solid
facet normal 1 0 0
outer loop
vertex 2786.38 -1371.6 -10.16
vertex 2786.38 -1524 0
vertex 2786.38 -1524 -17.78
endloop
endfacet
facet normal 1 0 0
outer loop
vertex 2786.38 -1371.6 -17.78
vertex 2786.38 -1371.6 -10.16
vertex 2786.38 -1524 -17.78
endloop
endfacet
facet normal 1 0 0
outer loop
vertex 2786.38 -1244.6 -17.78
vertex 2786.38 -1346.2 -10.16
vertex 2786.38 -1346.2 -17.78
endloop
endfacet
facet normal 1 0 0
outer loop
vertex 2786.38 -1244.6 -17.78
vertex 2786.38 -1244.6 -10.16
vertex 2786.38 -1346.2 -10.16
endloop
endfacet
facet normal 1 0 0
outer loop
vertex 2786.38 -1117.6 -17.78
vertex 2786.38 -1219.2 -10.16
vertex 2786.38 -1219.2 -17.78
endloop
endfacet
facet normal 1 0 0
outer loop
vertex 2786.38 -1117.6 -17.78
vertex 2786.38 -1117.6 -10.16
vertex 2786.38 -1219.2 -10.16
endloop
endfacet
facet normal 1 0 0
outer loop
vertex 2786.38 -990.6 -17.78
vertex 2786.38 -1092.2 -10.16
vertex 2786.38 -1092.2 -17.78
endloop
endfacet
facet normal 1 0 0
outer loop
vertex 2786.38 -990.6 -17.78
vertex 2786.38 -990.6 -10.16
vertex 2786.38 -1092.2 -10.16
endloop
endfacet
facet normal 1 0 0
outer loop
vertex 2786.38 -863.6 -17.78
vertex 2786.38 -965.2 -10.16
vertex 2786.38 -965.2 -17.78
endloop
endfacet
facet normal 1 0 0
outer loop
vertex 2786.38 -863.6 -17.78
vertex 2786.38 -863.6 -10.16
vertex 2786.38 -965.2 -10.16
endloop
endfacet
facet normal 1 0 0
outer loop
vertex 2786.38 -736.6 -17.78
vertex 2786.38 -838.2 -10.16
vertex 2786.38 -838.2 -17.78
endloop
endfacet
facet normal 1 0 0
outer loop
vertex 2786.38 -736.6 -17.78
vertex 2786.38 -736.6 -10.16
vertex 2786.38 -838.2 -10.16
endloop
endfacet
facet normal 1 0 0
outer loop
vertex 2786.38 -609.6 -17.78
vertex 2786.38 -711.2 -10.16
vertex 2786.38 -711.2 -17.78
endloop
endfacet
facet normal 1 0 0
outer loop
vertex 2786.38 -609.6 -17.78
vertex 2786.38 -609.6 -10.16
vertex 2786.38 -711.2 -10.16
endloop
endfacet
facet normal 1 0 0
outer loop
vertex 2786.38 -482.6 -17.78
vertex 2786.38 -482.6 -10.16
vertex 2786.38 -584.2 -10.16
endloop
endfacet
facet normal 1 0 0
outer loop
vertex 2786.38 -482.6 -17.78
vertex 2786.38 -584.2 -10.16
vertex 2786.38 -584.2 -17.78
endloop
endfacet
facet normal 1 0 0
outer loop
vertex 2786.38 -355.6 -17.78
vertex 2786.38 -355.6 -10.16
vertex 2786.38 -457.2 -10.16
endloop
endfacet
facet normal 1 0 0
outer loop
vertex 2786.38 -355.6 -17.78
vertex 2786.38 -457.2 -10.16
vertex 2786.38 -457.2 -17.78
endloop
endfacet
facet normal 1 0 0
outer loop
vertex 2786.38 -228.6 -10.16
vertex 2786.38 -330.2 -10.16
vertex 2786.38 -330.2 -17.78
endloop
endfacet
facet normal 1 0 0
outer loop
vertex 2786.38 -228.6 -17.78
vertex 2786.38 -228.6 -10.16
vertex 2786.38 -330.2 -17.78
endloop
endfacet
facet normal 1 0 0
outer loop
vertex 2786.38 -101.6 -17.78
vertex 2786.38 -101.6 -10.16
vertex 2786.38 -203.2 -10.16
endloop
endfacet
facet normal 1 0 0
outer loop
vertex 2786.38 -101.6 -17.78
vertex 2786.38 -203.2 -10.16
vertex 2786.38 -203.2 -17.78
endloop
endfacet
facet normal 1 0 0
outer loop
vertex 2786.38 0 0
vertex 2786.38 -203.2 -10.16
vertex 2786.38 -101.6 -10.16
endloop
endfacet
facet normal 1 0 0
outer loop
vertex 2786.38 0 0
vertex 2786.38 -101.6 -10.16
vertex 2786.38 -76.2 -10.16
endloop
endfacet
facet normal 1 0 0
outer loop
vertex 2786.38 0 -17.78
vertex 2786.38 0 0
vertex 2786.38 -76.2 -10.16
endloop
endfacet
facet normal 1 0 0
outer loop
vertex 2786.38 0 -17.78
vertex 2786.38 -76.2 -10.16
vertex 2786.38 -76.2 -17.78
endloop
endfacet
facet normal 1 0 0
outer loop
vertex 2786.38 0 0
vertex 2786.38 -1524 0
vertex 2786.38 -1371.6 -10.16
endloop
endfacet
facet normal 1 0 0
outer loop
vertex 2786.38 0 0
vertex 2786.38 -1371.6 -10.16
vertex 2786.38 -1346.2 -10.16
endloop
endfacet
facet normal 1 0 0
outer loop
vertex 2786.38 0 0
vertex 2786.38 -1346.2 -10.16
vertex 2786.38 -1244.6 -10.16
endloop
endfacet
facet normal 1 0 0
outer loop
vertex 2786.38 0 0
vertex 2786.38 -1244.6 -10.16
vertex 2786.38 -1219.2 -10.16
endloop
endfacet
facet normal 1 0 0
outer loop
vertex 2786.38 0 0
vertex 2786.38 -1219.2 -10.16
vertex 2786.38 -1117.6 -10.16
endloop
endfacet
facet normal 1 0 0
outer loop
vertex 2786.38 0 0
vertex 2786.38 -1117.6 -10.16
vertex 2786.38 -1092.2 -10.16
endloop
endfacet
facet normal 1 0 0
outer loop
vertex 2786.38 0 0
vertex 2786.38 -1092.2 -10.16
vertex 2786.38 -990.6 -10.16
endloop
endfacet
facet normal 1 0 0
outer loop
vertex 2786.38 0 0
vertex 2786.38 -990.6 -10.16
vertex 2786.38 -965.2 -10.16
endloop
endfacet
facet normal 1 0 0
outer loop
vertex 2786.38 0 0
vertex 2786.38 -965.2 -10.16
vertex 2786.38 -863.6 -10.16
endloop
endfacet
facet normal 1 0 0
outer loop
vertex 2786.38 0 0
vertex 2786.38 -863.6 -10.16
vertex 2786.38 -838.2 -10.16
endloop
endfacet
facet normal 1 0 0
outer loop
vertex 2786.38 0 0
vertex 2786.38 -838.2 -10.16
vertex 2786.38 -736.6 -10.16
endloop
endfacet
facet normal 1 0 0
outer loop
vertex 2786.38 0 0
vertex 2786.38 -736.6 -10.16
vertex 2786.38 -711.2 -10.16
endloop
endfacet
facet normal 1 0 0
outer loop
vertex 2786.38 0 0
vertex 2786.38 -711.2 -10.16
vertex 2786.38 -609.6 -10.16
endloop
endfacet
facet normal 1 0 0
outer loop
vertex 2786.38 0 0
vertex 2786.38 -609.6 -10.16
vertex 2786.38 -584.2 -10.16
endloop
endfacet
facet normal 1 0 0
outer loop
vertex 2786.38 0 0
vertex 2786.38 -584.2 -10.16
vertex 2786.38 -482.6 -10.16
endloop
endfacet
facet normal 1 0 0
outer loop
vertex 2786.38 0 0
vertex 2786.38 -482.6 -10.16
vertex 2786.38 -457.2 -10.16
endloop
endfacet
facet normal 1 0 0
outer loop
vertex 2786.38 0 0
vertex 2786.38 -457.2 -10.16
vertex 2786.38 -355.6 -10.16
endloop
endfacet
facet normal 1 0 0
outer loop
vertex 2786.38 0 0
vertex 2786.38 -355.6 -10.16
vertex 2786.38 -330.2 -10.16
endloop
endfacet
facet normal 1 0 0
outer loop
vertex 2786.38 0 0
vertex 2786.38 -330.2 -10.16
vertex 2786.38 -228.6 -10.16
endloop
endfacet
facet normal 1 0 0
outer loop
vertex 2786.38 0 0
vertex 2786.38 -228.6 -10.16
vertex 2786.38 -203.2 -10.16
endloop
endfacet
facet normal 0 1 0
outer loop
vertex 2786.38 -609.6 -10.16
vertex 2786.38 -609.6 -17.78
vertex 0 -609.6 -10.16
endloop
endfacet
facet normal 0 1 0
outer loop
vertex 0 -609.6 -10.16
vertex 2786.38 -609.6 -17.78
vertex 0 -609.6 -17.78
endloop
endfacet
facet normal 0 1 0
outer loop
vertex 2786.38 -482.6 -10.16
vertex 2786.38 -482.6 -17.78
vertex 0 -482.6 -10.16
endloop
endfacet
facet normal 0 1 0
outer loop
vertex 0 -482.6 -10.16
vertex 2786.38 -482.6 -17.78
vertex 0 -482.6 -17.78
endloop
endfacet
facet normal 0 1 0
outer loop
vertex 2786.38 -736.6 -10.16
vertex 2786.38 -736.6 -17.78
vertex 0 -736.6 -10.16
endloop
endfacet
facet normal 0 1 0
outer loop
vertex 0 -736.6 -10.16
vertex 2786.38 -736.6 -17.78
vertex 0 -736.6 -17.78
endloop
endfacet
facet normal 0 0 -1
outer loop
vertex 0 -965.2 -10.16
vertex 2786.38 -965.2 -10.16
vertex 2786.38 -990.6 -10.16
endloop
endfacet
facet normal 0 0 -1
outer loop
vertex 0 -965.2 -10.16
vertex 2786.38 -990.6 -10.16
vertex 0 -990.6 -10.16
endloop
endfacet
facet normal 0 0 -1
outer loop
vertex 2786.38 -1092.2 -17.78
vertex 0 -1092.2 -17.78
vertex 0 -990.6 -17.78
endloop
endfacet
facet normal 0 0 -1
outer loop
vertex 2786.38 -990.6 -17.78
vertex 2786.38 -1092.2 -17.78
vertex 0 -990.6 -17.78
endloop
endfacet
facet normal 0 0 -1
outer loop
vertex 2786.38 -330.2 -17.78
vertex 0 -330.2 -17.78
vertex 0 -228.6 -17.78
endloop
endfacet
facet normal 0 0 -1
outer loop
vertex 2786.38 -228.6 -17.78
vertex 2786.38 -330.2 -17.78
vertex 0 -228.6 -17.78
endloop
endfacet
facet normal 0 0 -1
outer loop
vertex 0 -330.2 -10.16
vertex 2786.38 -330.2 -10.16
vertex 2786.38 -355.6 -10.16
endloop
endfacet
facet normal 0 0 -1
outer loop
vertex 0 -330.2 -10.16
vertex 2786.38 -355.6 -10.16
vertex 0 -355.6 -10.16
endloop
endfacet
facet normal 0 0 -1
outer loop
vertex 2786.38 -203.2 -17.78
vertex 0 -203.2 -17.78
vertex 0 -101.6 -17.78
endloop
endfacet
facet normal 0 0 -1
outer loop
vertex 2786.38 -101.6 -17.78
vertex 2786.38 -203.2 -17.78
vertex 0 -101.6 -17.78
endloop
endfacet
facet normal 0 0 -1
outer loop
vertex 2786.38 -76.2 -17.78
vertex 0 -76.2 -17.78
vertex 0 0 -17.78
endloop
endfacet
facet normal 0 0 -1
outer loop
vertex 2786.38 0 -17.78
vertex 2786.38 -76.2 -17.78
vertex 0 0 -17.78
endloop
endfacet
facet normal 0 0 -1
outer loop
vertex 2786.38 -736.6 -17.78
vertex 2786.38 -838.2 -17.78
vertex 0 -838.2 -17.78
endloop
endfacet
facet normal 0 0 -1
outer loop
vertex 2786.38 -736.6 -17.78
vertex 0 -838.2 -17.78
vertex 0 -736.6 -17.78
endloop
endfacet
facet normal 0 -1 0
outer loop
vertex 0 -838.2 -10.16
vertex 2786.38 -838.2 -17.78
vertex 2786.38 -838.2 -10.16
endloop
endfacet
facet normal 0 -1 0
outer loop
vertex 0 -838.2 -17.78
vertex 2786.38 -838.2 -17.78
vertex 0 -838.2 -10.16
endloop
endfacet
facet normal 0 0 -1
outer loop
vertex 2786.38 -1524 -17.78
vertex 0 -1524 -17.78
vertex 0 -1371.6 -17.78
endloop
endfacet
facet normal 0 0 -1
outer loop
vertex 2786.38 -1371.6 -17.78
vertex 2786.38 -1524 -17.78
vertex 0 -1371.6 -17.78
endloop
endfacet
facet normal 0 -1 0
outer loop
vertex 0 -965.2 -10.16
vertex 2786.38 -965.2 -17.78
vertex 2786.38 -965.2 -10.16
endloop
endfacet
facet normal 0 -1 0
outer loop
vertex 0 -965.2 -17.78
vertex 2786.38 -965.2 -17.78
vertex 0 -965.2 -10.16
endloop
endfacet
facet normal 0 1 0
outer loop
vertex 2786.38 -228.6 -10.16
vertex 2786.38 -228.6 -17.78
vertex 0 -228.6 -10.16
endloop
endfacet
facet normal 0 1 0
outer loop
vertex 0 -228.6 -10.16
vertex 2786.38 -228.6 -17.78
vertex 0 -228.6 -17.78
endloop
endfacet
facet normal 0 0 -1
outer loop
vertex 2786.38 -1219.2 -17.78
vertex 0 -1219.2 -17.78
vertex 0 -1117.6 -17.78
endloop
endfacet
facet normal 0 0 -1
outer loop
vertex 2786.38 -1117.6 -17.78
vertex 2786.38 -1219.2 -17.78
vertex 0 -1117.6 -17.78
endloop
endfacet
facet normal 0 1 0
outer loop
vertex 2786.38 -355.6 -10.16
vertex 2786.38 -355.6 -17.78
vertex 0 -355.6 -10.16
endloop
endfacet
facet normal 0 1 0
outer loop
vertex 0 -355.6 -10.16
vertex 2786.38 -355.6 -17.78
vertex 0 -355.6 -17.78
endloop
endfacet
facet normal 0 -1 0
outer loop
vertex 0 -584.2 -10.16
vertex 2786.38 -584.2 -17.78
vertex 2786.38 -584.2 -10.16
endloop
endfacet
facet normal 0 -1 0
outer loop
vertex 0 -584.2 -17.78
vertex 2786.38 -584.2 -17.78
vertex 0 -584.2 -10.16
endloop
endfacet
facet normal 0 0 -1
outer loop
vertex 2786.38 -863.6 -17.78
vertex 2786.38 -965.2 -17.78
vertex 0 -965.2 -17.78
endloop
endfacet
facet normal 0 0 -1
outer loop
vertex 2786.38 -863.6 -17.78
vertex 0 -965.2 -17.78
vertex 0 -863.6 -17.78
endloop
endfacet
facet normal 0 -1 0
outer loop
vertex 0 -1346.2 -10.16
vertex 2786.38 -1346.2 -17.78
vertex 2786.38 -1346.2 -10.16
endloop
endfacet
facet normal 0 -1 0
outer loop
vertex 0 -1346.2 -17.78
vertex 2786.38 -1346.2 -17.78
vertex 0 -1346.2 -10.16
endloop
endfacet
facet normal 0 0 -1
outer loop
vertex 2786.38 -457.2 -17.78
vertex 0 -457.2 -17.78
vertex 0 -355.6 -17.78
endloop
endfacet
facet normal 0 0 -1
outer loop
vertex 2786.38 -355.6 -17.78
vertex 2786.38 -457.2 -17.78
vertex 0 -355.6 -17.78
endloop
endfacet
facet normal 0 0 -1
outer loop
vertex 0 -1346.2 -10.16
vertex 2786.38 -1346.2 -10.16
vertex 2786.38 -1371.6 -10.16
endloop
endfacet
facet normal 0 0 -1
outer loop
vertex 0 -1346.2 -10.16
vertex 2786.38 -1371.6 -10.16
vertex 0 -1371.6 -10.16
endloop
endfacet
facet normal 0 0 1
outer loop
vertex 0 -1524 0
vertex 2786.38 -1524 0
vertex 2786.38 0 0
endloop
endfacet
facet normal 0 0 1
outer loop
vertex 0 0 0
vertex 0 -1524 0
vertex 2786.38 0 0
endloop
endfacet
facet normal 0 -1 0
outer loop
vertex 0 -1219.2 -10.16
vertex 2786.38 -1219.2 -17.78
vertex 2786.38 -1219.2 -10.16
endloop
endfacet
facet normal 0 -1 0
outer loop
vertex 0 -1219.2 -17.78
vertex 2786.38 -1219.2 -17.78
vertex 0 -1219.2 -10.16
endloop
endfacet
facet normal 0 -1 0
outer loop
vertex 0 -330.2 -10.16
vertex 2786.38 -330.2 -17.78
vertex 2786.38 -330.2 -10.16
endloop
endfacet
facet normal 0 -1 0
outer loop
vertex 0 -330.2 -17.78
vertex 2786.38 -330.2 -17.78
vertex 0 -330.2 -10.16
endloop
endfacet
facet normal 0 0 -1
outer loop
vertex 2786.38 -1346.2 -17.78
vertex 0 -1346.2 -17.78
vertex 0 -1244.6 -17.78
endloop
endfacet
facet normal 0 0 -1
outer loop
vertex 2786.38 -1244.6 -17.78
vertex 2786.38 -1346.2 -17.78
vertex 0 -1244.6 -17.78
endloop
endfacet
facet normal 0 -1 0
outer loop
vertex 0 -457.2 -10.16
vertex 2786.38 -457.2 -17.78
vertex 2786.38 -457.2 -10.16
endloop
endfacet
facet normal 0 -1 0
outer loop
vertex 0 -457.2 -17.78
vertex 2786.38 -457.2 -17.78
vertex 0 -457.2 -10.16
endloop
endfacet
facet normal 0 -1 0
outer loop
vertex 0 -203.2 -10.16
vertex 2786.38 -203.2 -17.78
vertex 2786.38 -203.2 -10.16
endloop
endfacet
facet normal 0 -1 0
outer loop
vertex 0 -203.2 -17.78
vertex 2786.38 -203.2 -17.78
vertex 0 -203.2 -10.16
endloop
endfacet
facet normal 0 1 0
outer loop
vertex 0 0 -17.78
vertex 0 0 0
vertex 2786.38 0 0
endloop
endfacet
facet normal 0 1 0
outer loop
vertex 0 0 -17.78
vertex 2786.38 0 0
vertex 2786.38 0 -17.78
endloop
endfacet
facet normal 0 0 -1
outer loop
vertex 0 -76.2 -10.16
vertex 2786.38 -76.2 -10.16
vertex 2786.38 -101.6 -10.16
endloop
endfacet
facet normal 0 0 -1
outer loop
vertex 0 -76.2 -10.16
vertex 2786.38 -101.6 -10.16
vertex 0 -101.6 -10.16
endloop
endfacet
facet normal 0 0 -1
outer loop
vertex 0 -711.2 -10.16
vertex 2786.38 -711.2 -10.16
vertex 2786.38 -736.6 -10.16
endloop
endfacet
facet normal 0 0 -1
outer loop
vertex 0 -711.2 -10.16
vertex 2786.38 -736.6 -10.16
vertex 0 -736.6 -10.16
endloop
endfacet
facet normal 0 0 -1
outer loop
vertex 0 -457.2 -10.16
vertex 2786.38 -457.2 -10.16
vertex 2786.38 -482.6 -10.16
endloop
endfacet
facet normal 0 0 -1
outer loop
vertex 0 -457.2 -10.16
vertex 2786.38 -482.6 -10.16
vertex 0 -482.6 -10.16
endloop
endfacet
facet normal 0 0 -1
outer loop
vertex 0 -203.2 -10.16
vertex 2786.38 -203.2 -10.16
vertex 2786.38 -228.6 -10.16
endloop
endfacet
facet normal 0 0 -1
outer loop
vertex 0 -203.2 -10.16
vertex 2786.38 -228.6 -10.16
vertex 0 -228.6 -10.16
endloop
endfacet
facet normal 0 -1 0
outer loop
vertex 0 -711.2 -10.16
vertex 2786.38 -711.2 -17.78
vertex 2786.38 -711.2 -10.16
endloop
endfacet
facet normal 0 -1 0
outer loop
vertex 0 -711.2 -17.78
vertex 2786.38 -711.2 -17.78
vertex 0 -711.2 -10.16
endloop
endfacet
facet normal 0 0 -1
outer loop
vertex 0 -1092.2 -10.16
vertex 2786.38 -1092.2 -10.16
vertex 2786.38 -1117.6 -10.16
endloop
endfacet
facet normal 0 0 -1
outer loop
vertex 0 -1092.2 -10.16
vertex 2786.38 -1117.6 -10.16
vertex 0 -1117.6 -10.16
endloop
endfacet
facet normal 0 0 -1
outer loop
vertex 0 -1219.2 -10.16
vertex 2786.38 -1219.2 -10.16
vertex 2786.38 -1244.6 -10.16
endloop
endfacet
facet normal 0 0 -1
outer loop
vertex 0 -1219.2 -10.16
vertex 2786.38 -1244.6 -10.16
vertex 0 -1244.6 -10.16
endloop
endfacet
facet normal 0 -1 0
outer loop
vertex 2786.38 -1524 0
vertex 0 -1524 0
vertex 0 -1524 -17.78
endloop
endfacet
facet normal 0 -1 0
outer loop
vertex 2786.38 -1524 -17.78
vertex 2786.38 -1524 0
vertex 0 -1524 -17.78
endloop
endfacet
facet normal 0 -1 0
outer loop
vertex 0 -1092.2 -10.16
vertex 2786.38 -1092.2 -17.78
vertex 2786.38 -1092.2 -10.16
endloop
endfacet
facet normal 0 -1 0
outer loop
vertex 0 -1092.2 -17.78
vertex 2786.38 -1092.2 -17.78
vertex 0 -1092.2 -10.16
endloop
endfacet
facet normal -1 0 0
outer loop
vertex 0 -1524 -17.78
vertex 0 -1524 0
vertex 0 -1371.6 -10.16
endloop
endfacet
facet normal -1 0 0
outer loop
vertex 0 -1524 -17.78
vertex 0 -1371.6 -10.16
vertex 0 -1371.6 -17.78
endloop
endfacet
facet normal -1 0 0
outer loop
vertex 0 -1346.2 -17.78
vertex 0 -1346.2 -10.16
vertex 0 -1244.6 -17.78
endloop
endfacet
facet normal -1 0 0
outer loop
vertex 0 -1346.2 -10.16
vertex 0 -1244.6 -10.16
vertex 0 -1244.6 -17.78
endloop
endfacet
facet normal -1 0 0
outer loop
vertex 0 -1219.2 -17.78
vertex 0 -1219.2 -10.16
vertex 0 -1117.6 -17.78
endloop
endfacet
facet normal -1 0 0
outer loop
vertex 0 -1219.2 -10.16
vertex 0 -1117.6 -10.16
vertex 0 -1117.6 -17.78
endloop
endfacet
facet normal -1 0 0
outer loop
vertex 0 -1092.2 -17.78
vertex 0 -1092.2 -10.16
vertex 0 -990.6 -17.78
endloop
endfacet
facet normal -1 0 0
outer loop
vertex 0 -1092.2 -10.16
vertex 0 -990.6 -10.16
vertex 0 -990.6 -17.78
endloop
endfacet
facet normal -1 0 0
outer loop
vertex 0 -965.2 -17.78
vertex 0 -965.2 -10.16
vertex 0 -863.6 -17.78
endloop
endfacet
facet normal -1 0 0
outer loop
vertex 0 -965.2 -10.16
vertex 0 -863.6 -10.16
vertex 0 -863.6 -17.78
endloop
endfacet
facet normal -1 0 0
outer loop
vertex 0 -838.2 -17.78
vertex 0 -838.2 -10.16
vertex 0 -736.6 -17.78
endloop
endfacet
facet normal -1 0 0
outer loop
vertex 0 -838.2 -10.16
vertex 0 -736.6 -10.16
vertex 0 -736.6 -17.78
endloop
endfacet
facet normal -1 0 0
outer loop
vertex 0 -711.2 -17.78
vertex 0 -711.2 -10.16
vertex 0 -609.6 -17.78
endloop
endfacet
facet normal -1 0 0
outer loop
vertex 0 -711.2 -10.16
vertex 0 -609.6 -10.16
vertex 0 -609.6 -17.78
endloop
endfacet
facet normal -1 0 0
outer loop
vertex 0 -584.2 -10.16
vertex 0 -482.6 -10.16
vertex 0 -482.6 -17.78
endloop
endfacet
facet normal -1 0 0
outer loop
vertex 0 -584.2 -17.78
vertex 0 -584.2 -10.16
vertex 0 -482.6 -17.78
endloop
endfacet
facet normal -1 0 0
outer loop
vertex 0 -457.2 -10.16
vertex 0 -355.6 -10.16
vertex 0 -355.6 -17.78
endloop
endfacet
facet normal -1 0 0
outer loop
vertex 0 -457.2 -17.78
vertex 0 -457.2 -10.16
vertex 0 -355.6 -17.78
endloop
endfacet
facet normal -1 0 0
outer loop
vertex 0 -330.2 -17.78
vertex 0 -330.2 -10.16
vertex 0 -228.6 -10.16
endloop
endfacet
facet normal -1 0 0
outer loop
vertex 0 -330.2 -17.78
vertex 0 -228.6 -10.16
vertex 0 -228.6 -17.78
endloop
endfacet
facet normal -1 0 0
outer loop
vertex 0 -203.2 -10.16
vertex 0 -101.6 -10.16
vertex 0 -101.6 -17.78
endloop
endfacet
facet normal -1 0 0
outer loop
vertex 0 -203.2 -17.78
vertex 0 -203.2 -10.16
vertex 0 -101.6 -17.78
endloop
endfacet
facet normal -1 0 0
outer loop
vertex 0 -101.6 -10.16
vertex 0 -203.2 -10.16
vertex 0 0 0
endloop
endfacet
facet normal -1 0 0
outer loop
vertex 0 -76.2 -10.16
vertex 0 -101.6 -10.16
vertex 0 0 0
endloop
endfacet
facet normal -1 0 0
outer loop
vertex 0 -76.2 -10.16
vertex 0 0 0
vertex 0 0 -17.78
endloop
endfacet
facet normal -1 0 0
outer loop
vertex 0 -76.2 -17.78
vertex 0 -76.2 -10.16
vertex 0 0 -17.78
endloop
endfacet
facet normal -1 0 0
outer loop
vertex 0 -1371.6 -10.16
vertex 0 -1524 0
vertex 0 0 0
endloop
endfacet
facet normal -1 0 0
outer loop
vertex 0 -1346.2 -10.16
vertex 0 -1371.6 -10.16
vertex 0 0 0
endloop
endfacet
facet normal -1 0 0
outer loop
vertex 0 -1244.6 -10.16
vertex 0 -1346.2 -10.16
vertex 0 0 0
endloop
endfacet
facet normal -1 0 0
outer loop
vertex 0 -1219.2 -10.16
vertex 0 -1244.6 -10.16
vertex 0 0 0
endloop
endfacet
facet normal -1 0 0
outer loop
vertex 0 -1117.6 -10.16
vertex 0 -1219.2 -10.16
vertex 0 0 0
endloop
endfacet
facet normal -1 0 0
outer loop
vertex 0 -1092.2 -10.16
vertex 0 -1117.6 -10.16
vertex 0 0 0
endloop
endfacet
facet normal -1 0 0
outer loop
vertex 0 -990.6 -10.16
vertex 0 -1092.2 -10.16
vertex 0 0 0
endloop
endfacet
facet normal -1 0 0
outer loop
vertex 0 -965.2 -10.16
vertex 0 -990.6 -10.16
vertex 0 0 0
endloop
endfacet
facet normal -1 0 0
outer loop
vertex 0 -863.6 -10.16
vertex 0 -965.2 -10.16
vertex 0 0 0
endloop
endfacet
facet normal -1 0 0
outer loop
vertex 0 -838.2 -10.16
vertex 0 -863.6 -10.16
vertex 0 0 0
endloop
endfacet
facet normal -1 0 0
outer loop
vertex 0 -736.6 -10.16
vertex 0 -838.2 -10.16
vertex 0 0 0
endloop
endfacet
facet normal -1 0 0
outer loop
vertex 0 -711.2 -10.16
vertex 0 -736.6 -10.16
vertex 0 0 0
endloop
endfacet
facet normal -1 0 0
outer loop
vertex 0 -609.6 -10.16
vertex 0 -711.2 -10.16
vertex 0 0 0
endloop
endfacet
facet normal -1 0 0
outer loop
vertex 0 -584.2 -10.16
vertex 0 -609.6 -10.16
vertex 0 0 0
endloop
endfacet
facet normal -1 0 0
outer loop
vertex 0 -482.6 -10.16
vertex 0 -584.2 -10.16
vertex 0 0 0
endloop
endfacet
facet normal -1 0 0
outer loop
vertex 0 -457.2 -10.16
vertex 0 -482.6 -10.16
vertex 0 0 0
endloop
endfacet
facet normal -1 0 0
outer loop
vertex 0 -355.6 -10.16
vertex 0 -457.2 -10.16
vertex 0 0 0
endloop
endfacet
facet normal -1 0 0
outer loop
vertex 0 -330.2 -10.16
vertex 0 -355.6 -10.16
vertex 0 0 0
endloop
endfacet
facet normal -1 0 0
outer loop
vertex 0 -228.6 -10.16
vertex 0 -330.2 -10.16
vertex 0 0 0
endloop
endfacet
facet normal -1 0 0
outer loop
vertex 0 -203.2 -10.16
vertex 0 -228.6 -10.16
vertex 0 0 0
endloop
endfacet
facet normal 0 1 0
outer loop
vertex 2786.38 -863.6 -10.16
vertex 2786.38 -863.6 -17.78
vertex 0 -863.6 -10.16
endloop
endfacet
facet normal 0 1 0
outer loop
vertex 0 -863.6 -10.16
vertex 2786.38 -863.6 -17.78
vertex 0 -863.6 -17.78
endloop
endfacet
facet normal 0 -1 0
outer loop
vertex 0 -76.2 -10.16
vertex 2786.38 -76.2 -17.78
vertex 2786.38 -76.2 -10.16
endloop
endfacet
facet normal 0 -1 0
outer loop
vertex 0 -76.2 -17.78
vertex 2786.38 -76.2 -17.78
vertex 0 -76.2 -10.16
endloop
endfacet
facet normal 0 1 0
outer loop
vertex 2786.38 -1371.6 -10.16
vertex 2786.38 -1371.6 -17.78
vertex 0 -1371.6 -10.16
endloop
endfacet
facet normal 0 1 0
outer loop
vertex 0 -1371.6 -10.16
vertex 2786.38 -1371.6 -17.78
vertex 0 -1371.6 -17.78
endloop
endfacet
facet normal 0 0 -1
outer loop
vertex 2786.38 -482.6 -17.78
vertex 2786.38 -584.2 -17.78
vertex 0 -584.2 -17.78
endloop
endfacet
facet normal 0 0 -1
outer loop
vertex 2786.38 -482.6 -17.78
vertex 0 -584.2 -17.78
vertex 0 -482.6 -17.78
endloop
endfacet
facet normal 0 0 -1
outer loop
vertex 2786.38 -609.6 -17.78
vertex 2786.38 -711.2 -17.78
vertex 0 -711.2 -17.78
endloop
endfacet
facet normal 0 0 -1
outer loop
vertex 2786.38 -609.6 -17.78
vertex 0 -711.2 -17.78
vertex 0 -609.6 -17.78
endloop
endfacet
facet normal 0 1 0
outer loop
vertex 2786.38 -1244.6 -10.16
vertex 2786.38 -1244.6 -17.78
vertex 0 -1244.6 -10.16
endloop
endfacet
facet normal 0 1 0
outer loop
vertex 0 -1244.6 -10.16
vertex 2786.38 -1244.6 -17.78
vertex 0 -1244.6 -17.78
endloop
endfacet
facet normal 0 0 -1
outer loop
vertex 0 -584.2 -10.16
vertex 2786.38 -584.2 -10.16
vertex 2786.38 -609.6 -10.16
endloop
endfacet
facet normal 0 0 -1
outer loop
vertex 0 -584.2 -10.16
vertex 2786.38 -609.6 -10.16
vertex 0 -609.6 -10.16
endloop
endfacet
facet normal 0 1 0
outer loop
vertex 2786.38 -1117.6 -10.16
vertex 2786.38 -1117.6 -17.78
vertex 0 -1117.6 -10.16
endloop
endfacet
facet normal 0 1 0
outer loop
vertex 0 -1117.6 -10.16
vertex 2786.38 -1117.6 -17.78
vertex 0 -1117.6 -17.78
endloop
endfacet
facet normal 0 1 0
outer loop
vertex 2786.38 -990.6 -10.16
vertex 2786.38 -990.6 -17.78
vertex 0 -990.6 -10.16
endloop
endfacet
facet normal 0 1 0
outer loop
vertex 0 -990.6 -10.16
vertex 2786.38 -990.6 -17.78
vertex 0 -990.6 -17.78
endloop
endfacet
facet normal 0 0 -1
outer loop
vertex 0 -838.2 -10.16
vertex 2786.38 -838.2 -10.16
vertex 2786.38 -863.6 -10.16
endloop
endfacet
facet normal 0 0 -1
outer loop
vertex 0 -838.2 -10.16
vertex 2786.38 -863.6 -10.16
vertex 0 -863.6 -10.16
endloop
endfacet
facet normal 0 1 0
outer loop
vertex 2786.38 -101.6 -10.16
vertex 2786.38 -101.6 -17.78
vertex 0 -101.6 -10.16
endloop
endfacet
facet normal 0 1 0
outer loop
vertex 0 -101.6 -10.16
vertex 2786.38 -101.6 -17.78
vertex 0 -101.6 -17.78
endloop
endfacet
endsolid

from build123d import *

# Parameters (mm, degrees)
SKETCH2_W           = 17.78
SKETCH2_H           = 1524
BOSS_EXTRUDE1_DEPTH = 2786.38
SKETCH3_W           = 2786.38
SKETCH3_H           = 25.4
CUT_EXTRUDE1_DEPTH  = 7.62


with BuildPart() as part:
    # Sketch2 → Boss-Extrude1 (new body)
    with BuildSketch(Plane(origin=(0, 0, 0), x_dir=(0, 0, -1), z_dir=(1, 0, 0))):
        with Locations((8.89, -762)):
            Rectangle(SKETCH2_W, SKETCH2_H)
    extrude(amount=BOSS_EXTRUDE1_DEPTH)

    # Sketch3 → Cut-Extrude1 (cut)
    with BuildSketch(Plane(origin=(0, 0, -17.78), x_dir=(-1, 0, 0), z_dir=(0, 0, -1))):
        with Locations((-1393.19, -88.9)):
            Rectangle(SKETCH3_W, SKETCH3_H)
        with Locations((-1393.19, -215.9)):
            Rectangle(SKETCH3_W, SKETCH3_H)
        with Locations((-1393.19, -342.9)):
            Rectangle(SKETCH3_W, SKETCH3_H)
        with Locations((-1393.19, -469.9)):
            Rectangle(SKETCH3_W, SKETCH3_H)
        with Locations((-1393.19, -596.9)):
            Rectangle(SKETCH3_W, SKETCH3_H)
        with Locations((-1393.19, -723.9)):
            Rectangle(SKETCH3_W, SKETCH3_H)
        with Locations((-1393.19, -850.9)):
            Rectangle(SKETCH3_W, SKETCH3_H)
        with Locations((-1393.19, -977.9)):
            Rectangle(SKETCH3_W, SKETCH3_H)
        with Locations((-1393.19, -1104.9)):
            Rectangle(SKETCH3_W, SKETCH3_H)
        with Locations((-1393.19, -1231.9)):
            Rectangle(SKETCH3_W, SKETCH3_H)
        with Locations((-1393.19, -1358.9)):
            Rectangle(SKETCH3_W, SKETCH3_H)
    extrude(amount=-CUT_EXTRUDE1_DEPTH, mode=Mode.SUBTRACT)


solid = part.part
